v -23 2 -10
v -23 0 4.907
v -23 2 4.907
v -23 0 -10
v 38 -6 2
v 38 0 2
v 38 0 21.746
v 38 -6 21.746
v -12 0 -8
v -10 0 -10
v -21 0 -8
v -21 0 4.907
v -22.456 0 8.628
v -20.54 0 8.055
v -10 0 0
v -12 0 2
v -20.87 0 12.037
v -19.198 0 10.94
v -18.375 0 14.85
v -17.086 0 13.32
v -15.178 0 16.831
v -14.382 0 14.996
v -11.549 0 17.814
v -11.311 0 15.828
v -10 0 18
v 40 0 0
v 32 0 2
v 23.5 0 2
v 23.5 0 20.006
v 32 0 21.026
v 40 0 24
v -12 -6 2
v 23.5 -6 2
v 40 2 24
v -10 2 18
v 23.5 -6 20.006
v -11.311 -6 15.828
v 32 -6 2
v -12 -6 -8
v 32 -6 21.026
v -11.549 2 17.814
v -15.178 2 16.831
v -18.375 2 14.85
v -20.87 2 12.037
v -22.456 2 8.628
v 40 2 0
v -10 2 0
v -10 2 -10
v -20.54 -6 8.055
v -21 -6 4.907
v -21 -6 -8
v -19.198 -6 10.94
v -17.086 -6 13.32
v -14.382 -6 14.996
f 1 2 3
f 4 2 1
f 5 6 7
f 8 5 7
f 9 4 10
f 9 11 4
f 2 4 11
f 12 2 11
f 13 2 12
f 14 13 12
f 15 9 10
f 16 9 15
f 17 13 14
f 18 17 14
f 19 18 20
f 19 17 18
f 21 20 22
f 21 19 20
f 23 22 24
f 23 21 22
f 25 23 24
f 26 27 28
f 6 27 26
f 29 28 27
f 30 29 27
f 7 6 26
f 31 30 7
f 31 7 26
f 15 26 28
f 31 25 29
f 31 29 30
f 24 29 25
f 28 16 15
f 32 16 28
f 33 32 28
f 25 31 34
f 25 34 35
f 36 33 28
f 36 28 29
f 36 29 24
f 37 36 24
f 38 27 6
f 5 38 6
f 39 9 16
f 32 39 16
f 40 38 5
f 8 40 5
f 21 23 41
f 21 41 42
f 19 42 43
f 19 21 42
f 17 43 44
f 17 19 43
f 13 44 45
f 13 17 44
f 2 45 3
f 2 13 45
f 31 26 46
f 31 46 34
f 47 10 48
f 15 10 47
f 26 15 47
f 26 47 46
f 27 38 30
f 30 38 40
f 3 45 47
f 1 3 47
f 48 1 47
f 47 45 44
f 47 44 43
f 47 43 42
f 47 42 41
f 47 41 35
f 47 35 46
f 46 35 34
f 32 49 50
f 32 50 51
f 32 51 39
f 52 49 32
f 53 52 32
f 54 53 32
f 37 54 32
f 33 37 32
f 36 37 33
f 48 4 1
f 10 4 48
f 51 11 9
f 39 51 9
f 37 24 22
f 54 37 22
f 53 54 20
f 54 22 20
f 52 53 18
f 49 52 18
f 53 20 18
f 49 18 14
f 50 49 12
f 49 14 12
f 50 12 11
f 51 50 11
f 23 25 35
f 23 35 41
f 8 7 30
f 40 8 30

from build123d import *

# Parameters (mm, degrees)
F1_DEPTH = 2
F3_DEPTH = 6
F4_W     = 8.5
F4_H     = 26
F5_DEPTH = 6


with BuildPart() as f1:
    # F0 (on Front) → F1 (new body)
    with BuildSketch(Plane.XZ):
        with BuildLine():
            Line((-10, -10), (-10, 0))
            Line((-10, 0), (-10, 18))
            Line((-10, 18), (-11.548888, 17.814133))
            ThreePointArc((-11.548888, 17.814133), (-19.724596, 13.534146), (-23, 4.906735))
            Line((-23, 4.906735), (-23, -10))
            Line((-23, -10), (-10, -10))
        make_face()
        Polygon((-10, 0), (0, 0), (40, 0), (40, 24), (-10, 18), align=None)
    extrude(amount=-F1_DEPTH)

    # F2 (on face) → F3 (join)
    with BuildSketch(Plane.XZ):
        with BuildLine():
            Line((0, 2), (38, 2))
            Line((38, 2), (38, 21.745651))
            Line((38, 21.745651), (-11.310597, 15.82838))
            ThreePointArc((-11.310597, 15.82838), (-18.228504, 12.206852), (-21, 4.906735))
            Line((-21, 4.906735), (-21, -8))
            Line((-21, -8), (-12, -8))
            Line((-12, -8), (-12, 2))
            Line((-12, 2), (0, 2))
        make_face()
    extrude(amount=F3_DEPTH)

    # F4 (on face) → F5 (cut)
    with BuildSketch(Plane.XZ.offset(6)):
        with Locations((27.75, 9.903788)):
            Rectangle(F4_W, F4_H)
    extrude(amount=-F5_DEPTH, mode=Mode.SUBTRACT)


solid = f1.part
